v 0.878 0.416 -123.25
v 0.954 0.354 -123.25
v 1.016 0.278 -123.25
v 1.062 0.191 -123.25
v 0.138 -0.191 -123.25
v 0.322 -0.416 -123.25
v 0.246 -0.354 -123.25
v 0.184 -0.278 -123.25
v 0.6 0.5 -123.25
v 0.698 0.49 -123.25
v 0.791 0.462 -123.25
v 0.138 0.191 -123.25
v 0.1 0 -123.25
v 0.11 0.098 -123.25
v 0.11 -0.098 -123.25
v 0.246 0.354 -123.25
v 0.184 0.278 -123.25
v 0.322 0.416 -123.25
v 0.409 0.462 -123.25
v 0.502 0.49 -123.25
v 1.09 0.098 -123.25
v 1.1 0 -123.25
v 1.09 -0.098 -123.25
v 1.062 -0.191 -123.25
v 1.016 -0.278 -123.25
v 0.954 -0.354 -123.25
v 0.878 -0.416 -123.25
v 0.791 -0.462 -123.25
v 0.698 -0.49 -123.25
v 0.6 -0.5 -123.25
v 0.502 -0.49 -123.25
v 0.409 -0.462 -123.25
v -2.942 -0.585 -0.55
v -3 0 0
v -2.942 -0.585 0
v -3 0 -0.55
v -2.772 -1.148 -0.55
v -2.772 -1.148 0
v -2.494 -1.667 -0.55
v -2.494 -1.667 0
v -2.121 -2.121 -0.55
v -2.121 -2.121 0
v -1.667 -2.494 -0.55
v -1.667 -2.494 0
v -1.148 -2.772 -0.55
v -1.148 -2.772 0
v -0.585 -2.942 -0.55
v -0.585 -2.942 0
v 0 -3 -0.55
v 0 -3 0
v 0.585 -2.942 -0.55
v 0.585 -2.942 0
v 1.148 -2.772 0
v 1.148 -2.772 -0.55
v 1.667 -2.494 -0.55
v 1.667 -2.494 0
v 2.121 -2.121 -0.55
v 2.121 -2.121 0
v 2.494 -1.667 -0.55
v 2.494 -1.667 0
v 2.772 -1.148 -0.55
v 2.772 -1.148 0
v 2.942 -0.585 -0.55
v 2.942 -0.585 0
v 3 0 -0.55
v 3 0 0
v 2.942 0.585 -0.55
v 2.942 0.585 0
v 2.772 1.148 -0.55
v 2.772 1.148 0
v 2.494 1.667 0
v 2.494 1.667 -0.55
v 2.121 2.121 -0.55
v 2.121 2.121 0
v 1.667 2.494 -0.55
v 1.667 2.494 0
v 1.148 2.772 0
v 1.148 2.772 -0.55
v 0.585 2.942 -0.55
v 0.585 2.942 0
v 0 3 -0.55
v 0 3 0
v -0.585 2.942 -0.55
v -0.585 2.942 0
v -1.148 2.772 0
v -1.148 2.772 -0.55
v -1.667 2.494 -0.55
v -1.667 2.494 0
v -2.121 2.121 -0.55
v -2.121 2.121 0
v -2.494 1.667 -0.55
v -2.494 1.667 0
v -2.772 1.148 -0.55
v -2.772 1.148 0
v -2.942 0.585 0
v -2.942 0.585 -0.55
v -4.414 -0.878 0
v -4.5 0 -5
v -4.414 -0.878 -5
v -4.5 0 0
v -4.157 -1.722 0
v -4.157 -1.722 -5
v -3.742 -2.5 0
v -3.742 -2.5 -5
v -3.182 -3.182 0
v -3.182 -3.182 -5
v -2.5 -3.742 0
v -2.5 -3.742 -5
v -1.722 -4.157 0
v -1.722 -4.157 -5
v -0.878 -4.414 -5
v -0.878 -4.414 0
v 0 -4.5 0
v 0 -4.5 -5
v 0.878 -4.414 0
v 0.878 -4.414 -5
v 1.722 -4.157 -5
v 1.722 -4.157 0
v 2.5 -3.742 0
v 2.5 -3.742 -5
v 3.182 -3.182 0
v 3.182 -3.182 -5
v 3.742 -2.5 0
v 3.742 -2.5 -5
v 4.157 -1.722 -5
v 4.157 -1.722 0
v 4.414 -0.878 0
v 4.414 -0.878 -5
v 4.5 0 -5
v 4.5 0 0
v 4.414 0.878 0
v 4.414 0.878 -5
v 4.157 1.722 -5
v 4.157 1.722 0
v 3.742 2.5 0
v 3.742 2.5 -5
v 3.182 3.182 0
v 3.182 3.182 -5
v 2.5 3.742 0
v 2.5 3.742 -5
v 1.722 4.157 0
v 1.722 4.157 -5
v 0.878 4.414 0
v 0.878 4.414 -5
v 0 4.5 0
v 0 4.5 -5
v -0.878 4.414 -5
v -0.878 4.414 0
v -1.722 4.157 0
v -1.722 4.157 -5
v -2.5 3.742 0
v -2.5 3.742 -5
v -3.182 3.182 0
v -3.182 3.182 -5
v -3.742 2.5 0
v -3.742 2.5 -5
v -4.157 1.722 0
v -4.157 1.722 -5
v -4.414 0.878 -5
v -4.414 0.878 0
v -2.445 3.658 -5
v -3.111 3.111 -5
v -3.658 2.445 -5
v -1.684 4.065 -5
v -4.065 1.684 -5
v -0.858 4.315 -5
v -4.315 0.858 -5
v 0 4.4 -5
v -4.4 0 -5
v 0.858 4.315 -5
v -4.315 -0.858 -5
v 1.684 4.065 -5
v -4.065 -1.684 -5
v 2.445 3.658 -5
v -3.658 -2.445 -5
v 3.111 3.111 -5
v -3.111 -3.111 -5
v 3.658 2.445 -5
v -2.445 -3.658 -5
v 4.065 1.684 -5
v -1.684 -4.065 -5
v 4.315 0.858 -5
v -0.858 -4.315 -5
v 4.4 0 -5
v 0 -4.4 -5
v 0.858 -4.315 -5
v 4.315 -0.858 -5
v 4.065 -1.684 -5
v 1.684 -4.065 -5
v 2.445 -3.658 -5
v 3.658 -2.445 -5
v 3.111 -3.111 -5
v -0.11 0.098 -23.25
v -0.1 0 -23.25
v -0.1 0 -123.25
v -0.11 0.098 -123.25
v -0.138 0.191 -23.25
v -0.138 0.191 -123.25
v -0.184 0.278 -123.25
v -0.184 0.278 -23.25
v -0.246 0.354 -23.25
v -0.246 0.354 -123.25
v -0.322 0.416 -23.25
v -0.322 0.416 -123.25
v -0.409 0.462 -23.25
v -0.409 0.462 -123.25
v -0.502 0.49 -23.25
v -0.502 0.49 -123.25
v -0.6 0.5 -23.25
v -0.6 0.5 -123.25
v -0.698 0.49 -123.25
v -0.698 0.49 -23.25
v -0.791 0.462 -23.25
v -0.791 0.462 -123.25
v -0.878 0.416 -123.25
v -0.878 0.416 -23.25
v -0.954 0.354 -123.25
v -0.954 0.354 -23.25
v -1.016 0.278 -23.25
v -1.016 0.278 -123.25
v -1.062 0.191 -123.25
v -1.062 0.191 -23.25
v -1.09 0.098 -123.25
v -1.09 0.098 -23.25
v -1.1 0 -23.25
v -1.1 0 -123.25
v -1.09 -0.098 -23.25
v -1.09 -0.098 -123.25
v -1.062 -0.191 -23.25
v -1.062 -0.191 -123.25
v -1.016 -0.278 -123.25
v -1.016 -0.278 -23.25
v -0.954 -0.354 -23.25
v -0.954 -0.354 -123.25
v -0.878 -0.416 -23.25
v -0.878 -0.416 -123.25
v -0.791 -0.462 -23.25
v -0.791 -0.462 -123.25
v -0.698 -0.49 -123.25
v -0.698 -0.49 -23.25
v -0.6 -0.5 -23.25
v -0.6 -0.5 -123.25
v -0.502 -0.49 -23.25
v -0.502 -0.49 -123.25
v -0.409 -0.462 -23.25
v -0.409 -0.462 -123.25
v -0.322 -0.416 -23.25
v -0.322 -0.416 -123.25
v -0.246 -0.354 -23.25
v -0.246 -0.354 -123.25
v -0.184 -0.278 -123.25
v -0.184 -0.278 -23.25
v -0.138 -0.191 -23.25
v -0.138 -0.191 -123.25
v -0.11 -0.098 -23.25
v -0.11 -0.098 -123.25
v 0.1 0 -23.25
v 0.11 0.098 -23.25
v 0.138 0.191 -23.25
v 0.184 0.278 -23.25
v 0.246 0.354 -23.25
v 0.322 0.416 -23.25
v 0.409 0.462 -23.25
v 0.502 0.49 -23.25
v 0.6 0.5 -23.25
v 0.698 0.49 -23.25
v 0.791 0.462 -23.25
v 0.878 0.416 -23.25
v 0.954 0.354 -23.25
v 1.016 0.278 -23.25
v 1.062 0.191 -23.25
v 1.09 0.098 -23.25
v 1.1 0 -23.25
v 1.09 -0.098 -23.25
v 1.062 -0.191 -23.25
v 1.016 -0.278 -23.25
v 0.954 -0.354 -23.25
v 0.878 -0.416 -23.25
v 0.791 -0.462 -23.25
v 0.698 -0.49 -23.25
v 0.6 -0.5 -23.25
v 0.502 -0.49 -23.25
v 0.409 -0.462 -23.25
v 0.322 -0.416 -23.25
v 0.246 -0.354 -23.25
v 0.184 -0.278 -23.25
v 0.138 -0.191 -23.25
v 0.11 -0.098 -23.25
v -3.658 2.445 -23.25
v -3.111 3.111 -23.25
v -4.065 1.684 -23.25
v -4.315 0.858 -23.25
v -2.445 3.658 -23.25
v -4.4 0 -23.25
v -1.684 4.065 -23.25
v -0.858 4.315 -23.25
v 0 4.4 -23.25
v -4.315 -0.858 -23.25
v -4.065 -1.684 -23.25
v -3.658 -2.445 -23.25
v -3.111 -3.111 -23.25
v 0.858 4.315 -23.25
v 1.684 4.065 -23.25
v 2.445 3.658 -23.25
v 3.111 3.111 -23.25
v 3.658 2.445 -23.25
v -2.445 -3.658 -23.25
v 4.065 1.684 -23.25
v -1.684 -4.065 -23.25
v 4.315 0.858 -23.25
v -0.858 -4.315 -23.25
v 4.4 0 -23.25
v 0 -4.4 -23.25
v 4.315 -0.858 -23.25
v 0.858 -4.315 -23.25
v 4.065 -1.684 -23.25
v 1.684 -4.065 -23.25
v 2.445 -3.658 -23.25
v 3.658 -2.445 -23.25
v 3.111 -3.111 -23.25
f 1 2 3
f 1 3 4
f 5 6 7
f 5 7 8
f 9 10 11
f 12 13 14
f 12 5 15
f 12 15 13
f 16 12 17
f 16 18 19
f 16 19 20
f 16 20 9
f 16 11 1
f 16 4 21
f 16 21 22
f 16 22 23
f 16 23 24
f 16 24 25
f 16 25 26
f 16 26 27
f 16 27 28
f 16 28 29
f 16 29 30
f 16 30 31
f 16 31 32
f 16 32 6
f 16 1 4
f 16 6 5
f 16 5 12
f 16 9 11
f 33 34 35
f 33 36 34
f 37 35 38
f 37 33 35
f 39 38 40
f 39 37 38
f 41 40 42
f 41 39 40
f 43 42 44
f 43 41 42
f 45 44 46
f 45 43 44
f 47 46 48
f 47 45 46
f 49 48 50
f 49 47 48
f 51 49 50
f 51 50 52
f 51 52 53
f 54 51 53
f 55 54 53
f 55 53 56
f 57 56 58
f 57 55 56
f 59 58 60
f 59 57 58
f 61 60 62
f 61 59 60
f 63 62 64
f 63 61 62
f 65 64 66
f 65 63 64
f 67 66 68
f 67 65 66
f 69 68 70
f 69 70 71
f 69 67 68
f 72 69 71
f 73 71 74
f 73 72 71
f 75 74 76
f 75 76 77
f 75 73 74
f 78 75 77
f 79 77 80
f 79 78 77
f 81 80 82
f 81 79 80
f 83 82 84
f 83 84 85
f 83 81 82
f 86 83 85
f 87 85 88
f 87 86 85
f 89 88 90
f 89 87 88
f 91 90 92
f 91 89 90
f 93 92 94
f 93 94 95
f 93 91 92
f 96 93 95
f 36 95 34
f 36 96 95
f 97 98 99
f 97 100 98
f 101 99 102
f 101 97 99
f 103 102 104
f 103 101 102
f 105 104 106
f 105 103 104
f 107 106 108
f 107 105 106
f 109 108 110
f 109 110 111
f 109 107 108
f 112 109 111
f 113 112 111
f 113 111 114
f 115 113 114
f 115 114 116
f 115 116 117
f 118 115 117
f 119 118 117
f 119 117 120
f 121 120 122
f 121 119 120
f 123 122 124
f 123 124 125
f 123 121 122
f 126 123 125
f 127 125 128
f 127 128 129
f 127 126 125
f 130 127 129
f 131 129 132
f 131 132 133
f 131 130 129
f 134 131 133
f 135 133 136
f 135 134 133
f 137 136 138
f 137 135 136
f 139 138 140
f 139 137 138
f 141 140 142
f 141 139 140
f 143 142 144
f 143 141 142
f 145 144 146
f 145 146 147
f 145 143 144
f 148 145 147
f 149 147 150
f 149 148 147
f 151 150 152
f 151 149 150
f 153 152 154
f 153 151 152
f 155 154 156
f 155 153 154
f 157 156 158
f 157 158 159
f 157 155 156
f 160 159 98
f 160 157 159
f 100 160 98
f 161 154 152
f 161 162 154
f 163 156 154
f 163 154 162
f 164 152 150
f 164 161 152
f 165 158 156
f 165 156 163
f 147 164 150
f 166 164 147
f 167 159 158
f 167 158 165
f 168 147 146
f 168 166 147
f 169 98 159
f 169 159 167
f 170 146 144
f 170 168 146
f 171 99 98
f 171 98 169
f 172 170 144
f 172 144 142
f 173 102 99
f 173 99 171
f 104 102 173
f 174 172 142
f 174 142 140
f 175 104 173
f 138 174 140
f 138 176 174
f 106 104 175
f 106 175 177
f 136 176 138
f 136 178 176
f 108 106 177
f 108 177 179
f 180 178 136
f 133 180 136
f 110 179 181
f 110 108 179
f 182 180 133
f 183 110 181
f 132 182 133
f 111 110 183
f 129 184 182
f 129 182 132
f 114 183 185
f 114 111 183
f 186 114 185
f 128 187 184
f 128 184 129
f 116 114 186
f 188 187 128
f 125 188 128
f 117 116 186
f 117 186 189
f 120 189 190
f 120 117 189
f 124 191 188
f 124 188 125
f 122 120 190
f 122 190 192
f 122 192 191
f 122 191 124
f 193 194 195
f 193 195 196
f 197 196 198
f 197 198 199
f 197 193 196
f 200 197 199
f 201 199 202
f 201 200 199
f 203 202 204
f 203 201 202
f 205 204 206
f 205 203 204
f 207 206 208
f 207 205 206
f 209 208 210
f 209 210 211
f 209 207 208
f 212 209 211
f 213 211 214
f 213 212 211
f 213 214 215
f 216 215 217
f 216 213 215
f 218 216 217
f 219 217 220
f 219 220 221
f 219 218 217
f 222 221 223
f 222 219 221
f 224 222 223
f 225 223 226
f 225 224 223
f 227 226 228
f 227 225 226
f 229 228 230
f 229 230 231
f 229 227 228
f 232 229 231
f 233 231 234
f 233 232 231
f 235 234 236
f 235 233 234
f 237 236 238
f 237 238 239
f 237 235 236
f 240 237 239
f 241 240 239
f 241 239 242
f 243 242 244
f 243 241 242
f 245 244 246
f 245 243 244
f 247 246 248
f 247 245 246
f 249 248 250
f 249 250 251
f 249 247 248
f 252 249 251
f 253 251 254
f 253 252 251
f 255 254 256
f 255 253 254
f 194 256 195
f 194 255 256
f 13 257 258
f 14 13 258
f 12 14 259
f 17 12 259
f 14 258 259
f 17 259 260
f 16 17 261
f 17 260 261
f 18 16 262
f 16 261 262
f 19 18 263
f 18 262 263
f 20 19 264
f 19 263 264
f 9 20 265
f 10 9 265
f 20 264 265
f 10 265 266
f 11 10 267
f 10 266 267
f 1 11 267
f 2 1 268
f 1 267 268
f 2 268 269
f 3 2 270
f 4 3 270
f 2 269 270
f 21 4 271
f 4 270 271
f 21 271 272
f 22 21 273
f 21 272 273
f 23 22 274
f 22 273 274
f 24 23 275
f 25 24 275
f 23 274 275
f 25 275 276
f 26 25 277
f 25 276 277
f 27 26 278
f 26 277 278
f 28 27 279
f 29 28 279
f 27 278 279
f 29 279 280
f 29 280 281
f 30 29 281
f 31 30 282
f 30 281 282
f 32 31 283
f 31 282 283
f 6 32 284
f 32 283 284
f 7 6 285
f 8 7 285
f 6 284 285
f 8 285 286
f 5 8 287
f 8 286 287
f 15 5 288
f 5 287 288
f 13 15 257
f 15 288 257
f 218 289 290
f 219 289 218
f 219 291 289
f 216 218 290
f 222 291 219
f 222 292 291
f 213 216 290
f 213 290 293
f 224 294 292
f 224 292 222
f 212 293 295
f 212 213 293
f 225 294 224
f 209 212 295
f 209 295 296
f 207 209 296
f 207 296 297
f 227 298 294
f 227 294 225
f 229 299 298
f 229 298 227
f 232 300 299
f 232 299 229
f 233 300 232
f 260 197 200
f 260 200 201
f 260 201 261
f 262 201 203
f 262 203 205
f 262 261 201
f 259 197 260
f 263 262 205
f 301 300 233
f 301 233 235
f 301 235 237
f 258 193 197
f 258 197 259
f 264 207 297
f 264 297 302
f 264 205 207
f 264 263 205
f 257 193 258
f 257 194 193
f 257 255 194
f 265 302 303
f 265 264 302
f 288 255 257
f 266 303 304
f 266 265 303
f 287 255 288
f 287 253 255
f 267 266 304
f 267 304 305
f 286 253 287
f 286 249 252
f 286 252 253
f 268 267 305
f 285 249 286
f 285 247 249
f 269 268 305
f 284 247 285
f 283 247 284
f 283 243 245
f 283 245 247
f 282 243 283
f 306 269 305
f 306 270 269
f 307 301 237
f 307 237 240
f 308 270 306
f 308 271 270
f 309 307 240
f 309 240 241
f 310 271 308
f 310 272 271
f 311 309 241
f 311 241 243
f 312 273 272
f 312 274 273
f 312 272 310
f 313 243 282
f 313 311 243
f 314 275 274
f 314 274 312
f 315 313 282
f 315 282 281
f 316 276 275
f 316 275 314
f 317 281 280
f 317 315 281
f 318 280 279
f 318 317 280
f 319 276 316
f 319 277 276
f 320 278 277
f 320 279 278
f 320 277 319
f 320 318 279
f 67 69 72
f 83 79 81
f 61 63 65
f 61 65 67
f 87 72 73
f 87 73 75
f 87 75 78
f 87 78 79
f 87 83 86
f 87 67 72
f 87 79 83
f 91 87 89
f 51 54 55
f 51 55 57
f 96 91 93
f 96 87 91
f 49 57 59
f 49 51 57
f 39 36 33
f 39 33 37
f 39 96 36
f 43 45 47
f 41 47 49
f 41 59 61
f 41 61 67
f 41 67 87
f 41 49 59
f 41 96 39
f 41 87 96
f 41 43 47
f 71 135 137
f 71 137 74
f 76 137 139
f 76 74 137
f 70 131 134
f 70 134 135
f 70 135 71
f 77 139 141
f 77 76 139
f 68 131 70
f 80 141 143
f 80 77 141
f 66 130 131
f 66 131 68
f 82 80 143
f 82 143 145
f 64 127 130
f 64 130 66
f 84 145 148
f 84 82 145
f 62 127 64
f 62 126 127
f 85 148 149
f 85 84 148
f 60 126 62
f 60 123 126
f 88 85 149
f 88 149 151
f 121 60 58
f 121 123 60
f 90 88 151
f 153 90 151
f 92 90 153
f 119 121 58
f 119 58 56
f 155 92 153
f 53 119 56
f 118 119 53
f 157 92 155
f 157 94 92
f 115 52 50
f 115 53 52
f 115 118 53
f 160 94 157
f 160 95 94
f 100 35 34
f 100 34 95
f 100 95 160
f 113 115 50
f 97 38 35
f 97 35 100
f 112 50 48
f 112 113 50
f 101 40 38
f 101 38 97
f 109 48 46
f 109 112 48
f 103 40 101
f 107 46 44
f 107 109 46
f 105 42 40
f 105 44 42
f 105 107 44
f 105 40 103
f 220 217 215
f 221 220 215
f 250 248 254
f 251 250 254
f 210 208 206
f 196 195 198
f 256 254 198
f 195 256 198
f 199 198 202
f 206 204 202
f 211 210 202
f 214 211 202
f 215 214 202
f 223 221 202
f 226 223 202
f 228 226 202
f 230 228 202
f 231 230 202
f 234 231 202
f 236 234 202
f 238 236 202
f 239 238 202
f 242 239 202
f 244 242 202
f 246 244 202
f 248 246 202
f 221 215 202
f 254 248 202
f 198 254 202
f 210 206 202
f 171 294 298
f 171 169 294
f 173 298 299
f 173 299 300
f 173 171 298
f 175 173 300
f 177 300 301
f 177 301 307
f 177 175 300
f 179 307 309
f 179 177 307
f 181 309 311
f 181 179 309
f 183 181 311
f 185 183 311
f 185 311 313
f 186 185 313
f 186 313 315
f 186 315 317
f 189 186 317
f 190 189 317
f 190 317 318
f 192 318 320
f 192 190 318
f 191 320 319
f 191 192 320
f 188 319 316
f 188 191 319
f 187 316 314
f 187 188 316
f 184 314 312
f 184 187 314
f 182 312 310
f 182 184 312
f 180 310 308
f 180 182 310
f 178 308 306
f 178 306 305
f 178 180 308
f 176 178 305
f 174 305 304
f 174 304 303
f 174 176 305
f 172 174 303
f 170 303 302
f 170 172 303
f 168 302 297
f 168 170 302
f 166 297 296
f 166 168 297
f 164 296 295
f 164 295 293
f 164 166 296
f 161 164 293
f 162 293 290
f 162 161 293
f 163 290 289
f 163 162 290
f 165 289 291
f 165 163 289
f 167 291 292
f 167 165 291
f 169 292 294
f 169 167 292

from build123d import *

# Parameters (mm, degrees)
SKETCH2_R           = 0.5
BOSS_EXTRUDE1_DEPTH = 100


with BuildPart() as part:
    # Sketch1 → Revolve1 (revolve)
    with BuildSketch(Plane(origin=(0, 0, 0), x_dir=(0, 0, -1), z_dir=(1, 0, 0)), mode=Mode.PRIVATE) as revolve1_sk:
        Polygon((0, 4.5), (0, 3), (0.55, 3), (0.55, 0), (23.25, 0), (23.25, 4.4), (5, 4.4), (5, 4.5), align=None)
    revolve(revolve1_sk.sketch.rotate(Axis((0, 0, 0), (0, 0, 1)), 90), axis=Axis((0, 0, 0), (0, 0, 1)))  # turned: the seam where the file's is

    # Sketch2 → Boss-Extrude1 (add)
    with BuildSketch(Plane(origin=(0, 0, -23.25), x_dir=(-1, 0, 0), z_dir=(0, 0, -1))):
        with Locations((-0.6, 0)):
            Circle(SKETCH2_R)
    boss_extrude1 = extrude(amount=BOSS_EXTRUDE1_DEPTH)

    # Mirror1: Boss-Extrude1 across plane
    add(boss_extrude1.mirror(Plane(origin=(0, 0, 0), x_dir=(0, 0, 1), z_dir=(1, 0, 0))))


solid = part.part
